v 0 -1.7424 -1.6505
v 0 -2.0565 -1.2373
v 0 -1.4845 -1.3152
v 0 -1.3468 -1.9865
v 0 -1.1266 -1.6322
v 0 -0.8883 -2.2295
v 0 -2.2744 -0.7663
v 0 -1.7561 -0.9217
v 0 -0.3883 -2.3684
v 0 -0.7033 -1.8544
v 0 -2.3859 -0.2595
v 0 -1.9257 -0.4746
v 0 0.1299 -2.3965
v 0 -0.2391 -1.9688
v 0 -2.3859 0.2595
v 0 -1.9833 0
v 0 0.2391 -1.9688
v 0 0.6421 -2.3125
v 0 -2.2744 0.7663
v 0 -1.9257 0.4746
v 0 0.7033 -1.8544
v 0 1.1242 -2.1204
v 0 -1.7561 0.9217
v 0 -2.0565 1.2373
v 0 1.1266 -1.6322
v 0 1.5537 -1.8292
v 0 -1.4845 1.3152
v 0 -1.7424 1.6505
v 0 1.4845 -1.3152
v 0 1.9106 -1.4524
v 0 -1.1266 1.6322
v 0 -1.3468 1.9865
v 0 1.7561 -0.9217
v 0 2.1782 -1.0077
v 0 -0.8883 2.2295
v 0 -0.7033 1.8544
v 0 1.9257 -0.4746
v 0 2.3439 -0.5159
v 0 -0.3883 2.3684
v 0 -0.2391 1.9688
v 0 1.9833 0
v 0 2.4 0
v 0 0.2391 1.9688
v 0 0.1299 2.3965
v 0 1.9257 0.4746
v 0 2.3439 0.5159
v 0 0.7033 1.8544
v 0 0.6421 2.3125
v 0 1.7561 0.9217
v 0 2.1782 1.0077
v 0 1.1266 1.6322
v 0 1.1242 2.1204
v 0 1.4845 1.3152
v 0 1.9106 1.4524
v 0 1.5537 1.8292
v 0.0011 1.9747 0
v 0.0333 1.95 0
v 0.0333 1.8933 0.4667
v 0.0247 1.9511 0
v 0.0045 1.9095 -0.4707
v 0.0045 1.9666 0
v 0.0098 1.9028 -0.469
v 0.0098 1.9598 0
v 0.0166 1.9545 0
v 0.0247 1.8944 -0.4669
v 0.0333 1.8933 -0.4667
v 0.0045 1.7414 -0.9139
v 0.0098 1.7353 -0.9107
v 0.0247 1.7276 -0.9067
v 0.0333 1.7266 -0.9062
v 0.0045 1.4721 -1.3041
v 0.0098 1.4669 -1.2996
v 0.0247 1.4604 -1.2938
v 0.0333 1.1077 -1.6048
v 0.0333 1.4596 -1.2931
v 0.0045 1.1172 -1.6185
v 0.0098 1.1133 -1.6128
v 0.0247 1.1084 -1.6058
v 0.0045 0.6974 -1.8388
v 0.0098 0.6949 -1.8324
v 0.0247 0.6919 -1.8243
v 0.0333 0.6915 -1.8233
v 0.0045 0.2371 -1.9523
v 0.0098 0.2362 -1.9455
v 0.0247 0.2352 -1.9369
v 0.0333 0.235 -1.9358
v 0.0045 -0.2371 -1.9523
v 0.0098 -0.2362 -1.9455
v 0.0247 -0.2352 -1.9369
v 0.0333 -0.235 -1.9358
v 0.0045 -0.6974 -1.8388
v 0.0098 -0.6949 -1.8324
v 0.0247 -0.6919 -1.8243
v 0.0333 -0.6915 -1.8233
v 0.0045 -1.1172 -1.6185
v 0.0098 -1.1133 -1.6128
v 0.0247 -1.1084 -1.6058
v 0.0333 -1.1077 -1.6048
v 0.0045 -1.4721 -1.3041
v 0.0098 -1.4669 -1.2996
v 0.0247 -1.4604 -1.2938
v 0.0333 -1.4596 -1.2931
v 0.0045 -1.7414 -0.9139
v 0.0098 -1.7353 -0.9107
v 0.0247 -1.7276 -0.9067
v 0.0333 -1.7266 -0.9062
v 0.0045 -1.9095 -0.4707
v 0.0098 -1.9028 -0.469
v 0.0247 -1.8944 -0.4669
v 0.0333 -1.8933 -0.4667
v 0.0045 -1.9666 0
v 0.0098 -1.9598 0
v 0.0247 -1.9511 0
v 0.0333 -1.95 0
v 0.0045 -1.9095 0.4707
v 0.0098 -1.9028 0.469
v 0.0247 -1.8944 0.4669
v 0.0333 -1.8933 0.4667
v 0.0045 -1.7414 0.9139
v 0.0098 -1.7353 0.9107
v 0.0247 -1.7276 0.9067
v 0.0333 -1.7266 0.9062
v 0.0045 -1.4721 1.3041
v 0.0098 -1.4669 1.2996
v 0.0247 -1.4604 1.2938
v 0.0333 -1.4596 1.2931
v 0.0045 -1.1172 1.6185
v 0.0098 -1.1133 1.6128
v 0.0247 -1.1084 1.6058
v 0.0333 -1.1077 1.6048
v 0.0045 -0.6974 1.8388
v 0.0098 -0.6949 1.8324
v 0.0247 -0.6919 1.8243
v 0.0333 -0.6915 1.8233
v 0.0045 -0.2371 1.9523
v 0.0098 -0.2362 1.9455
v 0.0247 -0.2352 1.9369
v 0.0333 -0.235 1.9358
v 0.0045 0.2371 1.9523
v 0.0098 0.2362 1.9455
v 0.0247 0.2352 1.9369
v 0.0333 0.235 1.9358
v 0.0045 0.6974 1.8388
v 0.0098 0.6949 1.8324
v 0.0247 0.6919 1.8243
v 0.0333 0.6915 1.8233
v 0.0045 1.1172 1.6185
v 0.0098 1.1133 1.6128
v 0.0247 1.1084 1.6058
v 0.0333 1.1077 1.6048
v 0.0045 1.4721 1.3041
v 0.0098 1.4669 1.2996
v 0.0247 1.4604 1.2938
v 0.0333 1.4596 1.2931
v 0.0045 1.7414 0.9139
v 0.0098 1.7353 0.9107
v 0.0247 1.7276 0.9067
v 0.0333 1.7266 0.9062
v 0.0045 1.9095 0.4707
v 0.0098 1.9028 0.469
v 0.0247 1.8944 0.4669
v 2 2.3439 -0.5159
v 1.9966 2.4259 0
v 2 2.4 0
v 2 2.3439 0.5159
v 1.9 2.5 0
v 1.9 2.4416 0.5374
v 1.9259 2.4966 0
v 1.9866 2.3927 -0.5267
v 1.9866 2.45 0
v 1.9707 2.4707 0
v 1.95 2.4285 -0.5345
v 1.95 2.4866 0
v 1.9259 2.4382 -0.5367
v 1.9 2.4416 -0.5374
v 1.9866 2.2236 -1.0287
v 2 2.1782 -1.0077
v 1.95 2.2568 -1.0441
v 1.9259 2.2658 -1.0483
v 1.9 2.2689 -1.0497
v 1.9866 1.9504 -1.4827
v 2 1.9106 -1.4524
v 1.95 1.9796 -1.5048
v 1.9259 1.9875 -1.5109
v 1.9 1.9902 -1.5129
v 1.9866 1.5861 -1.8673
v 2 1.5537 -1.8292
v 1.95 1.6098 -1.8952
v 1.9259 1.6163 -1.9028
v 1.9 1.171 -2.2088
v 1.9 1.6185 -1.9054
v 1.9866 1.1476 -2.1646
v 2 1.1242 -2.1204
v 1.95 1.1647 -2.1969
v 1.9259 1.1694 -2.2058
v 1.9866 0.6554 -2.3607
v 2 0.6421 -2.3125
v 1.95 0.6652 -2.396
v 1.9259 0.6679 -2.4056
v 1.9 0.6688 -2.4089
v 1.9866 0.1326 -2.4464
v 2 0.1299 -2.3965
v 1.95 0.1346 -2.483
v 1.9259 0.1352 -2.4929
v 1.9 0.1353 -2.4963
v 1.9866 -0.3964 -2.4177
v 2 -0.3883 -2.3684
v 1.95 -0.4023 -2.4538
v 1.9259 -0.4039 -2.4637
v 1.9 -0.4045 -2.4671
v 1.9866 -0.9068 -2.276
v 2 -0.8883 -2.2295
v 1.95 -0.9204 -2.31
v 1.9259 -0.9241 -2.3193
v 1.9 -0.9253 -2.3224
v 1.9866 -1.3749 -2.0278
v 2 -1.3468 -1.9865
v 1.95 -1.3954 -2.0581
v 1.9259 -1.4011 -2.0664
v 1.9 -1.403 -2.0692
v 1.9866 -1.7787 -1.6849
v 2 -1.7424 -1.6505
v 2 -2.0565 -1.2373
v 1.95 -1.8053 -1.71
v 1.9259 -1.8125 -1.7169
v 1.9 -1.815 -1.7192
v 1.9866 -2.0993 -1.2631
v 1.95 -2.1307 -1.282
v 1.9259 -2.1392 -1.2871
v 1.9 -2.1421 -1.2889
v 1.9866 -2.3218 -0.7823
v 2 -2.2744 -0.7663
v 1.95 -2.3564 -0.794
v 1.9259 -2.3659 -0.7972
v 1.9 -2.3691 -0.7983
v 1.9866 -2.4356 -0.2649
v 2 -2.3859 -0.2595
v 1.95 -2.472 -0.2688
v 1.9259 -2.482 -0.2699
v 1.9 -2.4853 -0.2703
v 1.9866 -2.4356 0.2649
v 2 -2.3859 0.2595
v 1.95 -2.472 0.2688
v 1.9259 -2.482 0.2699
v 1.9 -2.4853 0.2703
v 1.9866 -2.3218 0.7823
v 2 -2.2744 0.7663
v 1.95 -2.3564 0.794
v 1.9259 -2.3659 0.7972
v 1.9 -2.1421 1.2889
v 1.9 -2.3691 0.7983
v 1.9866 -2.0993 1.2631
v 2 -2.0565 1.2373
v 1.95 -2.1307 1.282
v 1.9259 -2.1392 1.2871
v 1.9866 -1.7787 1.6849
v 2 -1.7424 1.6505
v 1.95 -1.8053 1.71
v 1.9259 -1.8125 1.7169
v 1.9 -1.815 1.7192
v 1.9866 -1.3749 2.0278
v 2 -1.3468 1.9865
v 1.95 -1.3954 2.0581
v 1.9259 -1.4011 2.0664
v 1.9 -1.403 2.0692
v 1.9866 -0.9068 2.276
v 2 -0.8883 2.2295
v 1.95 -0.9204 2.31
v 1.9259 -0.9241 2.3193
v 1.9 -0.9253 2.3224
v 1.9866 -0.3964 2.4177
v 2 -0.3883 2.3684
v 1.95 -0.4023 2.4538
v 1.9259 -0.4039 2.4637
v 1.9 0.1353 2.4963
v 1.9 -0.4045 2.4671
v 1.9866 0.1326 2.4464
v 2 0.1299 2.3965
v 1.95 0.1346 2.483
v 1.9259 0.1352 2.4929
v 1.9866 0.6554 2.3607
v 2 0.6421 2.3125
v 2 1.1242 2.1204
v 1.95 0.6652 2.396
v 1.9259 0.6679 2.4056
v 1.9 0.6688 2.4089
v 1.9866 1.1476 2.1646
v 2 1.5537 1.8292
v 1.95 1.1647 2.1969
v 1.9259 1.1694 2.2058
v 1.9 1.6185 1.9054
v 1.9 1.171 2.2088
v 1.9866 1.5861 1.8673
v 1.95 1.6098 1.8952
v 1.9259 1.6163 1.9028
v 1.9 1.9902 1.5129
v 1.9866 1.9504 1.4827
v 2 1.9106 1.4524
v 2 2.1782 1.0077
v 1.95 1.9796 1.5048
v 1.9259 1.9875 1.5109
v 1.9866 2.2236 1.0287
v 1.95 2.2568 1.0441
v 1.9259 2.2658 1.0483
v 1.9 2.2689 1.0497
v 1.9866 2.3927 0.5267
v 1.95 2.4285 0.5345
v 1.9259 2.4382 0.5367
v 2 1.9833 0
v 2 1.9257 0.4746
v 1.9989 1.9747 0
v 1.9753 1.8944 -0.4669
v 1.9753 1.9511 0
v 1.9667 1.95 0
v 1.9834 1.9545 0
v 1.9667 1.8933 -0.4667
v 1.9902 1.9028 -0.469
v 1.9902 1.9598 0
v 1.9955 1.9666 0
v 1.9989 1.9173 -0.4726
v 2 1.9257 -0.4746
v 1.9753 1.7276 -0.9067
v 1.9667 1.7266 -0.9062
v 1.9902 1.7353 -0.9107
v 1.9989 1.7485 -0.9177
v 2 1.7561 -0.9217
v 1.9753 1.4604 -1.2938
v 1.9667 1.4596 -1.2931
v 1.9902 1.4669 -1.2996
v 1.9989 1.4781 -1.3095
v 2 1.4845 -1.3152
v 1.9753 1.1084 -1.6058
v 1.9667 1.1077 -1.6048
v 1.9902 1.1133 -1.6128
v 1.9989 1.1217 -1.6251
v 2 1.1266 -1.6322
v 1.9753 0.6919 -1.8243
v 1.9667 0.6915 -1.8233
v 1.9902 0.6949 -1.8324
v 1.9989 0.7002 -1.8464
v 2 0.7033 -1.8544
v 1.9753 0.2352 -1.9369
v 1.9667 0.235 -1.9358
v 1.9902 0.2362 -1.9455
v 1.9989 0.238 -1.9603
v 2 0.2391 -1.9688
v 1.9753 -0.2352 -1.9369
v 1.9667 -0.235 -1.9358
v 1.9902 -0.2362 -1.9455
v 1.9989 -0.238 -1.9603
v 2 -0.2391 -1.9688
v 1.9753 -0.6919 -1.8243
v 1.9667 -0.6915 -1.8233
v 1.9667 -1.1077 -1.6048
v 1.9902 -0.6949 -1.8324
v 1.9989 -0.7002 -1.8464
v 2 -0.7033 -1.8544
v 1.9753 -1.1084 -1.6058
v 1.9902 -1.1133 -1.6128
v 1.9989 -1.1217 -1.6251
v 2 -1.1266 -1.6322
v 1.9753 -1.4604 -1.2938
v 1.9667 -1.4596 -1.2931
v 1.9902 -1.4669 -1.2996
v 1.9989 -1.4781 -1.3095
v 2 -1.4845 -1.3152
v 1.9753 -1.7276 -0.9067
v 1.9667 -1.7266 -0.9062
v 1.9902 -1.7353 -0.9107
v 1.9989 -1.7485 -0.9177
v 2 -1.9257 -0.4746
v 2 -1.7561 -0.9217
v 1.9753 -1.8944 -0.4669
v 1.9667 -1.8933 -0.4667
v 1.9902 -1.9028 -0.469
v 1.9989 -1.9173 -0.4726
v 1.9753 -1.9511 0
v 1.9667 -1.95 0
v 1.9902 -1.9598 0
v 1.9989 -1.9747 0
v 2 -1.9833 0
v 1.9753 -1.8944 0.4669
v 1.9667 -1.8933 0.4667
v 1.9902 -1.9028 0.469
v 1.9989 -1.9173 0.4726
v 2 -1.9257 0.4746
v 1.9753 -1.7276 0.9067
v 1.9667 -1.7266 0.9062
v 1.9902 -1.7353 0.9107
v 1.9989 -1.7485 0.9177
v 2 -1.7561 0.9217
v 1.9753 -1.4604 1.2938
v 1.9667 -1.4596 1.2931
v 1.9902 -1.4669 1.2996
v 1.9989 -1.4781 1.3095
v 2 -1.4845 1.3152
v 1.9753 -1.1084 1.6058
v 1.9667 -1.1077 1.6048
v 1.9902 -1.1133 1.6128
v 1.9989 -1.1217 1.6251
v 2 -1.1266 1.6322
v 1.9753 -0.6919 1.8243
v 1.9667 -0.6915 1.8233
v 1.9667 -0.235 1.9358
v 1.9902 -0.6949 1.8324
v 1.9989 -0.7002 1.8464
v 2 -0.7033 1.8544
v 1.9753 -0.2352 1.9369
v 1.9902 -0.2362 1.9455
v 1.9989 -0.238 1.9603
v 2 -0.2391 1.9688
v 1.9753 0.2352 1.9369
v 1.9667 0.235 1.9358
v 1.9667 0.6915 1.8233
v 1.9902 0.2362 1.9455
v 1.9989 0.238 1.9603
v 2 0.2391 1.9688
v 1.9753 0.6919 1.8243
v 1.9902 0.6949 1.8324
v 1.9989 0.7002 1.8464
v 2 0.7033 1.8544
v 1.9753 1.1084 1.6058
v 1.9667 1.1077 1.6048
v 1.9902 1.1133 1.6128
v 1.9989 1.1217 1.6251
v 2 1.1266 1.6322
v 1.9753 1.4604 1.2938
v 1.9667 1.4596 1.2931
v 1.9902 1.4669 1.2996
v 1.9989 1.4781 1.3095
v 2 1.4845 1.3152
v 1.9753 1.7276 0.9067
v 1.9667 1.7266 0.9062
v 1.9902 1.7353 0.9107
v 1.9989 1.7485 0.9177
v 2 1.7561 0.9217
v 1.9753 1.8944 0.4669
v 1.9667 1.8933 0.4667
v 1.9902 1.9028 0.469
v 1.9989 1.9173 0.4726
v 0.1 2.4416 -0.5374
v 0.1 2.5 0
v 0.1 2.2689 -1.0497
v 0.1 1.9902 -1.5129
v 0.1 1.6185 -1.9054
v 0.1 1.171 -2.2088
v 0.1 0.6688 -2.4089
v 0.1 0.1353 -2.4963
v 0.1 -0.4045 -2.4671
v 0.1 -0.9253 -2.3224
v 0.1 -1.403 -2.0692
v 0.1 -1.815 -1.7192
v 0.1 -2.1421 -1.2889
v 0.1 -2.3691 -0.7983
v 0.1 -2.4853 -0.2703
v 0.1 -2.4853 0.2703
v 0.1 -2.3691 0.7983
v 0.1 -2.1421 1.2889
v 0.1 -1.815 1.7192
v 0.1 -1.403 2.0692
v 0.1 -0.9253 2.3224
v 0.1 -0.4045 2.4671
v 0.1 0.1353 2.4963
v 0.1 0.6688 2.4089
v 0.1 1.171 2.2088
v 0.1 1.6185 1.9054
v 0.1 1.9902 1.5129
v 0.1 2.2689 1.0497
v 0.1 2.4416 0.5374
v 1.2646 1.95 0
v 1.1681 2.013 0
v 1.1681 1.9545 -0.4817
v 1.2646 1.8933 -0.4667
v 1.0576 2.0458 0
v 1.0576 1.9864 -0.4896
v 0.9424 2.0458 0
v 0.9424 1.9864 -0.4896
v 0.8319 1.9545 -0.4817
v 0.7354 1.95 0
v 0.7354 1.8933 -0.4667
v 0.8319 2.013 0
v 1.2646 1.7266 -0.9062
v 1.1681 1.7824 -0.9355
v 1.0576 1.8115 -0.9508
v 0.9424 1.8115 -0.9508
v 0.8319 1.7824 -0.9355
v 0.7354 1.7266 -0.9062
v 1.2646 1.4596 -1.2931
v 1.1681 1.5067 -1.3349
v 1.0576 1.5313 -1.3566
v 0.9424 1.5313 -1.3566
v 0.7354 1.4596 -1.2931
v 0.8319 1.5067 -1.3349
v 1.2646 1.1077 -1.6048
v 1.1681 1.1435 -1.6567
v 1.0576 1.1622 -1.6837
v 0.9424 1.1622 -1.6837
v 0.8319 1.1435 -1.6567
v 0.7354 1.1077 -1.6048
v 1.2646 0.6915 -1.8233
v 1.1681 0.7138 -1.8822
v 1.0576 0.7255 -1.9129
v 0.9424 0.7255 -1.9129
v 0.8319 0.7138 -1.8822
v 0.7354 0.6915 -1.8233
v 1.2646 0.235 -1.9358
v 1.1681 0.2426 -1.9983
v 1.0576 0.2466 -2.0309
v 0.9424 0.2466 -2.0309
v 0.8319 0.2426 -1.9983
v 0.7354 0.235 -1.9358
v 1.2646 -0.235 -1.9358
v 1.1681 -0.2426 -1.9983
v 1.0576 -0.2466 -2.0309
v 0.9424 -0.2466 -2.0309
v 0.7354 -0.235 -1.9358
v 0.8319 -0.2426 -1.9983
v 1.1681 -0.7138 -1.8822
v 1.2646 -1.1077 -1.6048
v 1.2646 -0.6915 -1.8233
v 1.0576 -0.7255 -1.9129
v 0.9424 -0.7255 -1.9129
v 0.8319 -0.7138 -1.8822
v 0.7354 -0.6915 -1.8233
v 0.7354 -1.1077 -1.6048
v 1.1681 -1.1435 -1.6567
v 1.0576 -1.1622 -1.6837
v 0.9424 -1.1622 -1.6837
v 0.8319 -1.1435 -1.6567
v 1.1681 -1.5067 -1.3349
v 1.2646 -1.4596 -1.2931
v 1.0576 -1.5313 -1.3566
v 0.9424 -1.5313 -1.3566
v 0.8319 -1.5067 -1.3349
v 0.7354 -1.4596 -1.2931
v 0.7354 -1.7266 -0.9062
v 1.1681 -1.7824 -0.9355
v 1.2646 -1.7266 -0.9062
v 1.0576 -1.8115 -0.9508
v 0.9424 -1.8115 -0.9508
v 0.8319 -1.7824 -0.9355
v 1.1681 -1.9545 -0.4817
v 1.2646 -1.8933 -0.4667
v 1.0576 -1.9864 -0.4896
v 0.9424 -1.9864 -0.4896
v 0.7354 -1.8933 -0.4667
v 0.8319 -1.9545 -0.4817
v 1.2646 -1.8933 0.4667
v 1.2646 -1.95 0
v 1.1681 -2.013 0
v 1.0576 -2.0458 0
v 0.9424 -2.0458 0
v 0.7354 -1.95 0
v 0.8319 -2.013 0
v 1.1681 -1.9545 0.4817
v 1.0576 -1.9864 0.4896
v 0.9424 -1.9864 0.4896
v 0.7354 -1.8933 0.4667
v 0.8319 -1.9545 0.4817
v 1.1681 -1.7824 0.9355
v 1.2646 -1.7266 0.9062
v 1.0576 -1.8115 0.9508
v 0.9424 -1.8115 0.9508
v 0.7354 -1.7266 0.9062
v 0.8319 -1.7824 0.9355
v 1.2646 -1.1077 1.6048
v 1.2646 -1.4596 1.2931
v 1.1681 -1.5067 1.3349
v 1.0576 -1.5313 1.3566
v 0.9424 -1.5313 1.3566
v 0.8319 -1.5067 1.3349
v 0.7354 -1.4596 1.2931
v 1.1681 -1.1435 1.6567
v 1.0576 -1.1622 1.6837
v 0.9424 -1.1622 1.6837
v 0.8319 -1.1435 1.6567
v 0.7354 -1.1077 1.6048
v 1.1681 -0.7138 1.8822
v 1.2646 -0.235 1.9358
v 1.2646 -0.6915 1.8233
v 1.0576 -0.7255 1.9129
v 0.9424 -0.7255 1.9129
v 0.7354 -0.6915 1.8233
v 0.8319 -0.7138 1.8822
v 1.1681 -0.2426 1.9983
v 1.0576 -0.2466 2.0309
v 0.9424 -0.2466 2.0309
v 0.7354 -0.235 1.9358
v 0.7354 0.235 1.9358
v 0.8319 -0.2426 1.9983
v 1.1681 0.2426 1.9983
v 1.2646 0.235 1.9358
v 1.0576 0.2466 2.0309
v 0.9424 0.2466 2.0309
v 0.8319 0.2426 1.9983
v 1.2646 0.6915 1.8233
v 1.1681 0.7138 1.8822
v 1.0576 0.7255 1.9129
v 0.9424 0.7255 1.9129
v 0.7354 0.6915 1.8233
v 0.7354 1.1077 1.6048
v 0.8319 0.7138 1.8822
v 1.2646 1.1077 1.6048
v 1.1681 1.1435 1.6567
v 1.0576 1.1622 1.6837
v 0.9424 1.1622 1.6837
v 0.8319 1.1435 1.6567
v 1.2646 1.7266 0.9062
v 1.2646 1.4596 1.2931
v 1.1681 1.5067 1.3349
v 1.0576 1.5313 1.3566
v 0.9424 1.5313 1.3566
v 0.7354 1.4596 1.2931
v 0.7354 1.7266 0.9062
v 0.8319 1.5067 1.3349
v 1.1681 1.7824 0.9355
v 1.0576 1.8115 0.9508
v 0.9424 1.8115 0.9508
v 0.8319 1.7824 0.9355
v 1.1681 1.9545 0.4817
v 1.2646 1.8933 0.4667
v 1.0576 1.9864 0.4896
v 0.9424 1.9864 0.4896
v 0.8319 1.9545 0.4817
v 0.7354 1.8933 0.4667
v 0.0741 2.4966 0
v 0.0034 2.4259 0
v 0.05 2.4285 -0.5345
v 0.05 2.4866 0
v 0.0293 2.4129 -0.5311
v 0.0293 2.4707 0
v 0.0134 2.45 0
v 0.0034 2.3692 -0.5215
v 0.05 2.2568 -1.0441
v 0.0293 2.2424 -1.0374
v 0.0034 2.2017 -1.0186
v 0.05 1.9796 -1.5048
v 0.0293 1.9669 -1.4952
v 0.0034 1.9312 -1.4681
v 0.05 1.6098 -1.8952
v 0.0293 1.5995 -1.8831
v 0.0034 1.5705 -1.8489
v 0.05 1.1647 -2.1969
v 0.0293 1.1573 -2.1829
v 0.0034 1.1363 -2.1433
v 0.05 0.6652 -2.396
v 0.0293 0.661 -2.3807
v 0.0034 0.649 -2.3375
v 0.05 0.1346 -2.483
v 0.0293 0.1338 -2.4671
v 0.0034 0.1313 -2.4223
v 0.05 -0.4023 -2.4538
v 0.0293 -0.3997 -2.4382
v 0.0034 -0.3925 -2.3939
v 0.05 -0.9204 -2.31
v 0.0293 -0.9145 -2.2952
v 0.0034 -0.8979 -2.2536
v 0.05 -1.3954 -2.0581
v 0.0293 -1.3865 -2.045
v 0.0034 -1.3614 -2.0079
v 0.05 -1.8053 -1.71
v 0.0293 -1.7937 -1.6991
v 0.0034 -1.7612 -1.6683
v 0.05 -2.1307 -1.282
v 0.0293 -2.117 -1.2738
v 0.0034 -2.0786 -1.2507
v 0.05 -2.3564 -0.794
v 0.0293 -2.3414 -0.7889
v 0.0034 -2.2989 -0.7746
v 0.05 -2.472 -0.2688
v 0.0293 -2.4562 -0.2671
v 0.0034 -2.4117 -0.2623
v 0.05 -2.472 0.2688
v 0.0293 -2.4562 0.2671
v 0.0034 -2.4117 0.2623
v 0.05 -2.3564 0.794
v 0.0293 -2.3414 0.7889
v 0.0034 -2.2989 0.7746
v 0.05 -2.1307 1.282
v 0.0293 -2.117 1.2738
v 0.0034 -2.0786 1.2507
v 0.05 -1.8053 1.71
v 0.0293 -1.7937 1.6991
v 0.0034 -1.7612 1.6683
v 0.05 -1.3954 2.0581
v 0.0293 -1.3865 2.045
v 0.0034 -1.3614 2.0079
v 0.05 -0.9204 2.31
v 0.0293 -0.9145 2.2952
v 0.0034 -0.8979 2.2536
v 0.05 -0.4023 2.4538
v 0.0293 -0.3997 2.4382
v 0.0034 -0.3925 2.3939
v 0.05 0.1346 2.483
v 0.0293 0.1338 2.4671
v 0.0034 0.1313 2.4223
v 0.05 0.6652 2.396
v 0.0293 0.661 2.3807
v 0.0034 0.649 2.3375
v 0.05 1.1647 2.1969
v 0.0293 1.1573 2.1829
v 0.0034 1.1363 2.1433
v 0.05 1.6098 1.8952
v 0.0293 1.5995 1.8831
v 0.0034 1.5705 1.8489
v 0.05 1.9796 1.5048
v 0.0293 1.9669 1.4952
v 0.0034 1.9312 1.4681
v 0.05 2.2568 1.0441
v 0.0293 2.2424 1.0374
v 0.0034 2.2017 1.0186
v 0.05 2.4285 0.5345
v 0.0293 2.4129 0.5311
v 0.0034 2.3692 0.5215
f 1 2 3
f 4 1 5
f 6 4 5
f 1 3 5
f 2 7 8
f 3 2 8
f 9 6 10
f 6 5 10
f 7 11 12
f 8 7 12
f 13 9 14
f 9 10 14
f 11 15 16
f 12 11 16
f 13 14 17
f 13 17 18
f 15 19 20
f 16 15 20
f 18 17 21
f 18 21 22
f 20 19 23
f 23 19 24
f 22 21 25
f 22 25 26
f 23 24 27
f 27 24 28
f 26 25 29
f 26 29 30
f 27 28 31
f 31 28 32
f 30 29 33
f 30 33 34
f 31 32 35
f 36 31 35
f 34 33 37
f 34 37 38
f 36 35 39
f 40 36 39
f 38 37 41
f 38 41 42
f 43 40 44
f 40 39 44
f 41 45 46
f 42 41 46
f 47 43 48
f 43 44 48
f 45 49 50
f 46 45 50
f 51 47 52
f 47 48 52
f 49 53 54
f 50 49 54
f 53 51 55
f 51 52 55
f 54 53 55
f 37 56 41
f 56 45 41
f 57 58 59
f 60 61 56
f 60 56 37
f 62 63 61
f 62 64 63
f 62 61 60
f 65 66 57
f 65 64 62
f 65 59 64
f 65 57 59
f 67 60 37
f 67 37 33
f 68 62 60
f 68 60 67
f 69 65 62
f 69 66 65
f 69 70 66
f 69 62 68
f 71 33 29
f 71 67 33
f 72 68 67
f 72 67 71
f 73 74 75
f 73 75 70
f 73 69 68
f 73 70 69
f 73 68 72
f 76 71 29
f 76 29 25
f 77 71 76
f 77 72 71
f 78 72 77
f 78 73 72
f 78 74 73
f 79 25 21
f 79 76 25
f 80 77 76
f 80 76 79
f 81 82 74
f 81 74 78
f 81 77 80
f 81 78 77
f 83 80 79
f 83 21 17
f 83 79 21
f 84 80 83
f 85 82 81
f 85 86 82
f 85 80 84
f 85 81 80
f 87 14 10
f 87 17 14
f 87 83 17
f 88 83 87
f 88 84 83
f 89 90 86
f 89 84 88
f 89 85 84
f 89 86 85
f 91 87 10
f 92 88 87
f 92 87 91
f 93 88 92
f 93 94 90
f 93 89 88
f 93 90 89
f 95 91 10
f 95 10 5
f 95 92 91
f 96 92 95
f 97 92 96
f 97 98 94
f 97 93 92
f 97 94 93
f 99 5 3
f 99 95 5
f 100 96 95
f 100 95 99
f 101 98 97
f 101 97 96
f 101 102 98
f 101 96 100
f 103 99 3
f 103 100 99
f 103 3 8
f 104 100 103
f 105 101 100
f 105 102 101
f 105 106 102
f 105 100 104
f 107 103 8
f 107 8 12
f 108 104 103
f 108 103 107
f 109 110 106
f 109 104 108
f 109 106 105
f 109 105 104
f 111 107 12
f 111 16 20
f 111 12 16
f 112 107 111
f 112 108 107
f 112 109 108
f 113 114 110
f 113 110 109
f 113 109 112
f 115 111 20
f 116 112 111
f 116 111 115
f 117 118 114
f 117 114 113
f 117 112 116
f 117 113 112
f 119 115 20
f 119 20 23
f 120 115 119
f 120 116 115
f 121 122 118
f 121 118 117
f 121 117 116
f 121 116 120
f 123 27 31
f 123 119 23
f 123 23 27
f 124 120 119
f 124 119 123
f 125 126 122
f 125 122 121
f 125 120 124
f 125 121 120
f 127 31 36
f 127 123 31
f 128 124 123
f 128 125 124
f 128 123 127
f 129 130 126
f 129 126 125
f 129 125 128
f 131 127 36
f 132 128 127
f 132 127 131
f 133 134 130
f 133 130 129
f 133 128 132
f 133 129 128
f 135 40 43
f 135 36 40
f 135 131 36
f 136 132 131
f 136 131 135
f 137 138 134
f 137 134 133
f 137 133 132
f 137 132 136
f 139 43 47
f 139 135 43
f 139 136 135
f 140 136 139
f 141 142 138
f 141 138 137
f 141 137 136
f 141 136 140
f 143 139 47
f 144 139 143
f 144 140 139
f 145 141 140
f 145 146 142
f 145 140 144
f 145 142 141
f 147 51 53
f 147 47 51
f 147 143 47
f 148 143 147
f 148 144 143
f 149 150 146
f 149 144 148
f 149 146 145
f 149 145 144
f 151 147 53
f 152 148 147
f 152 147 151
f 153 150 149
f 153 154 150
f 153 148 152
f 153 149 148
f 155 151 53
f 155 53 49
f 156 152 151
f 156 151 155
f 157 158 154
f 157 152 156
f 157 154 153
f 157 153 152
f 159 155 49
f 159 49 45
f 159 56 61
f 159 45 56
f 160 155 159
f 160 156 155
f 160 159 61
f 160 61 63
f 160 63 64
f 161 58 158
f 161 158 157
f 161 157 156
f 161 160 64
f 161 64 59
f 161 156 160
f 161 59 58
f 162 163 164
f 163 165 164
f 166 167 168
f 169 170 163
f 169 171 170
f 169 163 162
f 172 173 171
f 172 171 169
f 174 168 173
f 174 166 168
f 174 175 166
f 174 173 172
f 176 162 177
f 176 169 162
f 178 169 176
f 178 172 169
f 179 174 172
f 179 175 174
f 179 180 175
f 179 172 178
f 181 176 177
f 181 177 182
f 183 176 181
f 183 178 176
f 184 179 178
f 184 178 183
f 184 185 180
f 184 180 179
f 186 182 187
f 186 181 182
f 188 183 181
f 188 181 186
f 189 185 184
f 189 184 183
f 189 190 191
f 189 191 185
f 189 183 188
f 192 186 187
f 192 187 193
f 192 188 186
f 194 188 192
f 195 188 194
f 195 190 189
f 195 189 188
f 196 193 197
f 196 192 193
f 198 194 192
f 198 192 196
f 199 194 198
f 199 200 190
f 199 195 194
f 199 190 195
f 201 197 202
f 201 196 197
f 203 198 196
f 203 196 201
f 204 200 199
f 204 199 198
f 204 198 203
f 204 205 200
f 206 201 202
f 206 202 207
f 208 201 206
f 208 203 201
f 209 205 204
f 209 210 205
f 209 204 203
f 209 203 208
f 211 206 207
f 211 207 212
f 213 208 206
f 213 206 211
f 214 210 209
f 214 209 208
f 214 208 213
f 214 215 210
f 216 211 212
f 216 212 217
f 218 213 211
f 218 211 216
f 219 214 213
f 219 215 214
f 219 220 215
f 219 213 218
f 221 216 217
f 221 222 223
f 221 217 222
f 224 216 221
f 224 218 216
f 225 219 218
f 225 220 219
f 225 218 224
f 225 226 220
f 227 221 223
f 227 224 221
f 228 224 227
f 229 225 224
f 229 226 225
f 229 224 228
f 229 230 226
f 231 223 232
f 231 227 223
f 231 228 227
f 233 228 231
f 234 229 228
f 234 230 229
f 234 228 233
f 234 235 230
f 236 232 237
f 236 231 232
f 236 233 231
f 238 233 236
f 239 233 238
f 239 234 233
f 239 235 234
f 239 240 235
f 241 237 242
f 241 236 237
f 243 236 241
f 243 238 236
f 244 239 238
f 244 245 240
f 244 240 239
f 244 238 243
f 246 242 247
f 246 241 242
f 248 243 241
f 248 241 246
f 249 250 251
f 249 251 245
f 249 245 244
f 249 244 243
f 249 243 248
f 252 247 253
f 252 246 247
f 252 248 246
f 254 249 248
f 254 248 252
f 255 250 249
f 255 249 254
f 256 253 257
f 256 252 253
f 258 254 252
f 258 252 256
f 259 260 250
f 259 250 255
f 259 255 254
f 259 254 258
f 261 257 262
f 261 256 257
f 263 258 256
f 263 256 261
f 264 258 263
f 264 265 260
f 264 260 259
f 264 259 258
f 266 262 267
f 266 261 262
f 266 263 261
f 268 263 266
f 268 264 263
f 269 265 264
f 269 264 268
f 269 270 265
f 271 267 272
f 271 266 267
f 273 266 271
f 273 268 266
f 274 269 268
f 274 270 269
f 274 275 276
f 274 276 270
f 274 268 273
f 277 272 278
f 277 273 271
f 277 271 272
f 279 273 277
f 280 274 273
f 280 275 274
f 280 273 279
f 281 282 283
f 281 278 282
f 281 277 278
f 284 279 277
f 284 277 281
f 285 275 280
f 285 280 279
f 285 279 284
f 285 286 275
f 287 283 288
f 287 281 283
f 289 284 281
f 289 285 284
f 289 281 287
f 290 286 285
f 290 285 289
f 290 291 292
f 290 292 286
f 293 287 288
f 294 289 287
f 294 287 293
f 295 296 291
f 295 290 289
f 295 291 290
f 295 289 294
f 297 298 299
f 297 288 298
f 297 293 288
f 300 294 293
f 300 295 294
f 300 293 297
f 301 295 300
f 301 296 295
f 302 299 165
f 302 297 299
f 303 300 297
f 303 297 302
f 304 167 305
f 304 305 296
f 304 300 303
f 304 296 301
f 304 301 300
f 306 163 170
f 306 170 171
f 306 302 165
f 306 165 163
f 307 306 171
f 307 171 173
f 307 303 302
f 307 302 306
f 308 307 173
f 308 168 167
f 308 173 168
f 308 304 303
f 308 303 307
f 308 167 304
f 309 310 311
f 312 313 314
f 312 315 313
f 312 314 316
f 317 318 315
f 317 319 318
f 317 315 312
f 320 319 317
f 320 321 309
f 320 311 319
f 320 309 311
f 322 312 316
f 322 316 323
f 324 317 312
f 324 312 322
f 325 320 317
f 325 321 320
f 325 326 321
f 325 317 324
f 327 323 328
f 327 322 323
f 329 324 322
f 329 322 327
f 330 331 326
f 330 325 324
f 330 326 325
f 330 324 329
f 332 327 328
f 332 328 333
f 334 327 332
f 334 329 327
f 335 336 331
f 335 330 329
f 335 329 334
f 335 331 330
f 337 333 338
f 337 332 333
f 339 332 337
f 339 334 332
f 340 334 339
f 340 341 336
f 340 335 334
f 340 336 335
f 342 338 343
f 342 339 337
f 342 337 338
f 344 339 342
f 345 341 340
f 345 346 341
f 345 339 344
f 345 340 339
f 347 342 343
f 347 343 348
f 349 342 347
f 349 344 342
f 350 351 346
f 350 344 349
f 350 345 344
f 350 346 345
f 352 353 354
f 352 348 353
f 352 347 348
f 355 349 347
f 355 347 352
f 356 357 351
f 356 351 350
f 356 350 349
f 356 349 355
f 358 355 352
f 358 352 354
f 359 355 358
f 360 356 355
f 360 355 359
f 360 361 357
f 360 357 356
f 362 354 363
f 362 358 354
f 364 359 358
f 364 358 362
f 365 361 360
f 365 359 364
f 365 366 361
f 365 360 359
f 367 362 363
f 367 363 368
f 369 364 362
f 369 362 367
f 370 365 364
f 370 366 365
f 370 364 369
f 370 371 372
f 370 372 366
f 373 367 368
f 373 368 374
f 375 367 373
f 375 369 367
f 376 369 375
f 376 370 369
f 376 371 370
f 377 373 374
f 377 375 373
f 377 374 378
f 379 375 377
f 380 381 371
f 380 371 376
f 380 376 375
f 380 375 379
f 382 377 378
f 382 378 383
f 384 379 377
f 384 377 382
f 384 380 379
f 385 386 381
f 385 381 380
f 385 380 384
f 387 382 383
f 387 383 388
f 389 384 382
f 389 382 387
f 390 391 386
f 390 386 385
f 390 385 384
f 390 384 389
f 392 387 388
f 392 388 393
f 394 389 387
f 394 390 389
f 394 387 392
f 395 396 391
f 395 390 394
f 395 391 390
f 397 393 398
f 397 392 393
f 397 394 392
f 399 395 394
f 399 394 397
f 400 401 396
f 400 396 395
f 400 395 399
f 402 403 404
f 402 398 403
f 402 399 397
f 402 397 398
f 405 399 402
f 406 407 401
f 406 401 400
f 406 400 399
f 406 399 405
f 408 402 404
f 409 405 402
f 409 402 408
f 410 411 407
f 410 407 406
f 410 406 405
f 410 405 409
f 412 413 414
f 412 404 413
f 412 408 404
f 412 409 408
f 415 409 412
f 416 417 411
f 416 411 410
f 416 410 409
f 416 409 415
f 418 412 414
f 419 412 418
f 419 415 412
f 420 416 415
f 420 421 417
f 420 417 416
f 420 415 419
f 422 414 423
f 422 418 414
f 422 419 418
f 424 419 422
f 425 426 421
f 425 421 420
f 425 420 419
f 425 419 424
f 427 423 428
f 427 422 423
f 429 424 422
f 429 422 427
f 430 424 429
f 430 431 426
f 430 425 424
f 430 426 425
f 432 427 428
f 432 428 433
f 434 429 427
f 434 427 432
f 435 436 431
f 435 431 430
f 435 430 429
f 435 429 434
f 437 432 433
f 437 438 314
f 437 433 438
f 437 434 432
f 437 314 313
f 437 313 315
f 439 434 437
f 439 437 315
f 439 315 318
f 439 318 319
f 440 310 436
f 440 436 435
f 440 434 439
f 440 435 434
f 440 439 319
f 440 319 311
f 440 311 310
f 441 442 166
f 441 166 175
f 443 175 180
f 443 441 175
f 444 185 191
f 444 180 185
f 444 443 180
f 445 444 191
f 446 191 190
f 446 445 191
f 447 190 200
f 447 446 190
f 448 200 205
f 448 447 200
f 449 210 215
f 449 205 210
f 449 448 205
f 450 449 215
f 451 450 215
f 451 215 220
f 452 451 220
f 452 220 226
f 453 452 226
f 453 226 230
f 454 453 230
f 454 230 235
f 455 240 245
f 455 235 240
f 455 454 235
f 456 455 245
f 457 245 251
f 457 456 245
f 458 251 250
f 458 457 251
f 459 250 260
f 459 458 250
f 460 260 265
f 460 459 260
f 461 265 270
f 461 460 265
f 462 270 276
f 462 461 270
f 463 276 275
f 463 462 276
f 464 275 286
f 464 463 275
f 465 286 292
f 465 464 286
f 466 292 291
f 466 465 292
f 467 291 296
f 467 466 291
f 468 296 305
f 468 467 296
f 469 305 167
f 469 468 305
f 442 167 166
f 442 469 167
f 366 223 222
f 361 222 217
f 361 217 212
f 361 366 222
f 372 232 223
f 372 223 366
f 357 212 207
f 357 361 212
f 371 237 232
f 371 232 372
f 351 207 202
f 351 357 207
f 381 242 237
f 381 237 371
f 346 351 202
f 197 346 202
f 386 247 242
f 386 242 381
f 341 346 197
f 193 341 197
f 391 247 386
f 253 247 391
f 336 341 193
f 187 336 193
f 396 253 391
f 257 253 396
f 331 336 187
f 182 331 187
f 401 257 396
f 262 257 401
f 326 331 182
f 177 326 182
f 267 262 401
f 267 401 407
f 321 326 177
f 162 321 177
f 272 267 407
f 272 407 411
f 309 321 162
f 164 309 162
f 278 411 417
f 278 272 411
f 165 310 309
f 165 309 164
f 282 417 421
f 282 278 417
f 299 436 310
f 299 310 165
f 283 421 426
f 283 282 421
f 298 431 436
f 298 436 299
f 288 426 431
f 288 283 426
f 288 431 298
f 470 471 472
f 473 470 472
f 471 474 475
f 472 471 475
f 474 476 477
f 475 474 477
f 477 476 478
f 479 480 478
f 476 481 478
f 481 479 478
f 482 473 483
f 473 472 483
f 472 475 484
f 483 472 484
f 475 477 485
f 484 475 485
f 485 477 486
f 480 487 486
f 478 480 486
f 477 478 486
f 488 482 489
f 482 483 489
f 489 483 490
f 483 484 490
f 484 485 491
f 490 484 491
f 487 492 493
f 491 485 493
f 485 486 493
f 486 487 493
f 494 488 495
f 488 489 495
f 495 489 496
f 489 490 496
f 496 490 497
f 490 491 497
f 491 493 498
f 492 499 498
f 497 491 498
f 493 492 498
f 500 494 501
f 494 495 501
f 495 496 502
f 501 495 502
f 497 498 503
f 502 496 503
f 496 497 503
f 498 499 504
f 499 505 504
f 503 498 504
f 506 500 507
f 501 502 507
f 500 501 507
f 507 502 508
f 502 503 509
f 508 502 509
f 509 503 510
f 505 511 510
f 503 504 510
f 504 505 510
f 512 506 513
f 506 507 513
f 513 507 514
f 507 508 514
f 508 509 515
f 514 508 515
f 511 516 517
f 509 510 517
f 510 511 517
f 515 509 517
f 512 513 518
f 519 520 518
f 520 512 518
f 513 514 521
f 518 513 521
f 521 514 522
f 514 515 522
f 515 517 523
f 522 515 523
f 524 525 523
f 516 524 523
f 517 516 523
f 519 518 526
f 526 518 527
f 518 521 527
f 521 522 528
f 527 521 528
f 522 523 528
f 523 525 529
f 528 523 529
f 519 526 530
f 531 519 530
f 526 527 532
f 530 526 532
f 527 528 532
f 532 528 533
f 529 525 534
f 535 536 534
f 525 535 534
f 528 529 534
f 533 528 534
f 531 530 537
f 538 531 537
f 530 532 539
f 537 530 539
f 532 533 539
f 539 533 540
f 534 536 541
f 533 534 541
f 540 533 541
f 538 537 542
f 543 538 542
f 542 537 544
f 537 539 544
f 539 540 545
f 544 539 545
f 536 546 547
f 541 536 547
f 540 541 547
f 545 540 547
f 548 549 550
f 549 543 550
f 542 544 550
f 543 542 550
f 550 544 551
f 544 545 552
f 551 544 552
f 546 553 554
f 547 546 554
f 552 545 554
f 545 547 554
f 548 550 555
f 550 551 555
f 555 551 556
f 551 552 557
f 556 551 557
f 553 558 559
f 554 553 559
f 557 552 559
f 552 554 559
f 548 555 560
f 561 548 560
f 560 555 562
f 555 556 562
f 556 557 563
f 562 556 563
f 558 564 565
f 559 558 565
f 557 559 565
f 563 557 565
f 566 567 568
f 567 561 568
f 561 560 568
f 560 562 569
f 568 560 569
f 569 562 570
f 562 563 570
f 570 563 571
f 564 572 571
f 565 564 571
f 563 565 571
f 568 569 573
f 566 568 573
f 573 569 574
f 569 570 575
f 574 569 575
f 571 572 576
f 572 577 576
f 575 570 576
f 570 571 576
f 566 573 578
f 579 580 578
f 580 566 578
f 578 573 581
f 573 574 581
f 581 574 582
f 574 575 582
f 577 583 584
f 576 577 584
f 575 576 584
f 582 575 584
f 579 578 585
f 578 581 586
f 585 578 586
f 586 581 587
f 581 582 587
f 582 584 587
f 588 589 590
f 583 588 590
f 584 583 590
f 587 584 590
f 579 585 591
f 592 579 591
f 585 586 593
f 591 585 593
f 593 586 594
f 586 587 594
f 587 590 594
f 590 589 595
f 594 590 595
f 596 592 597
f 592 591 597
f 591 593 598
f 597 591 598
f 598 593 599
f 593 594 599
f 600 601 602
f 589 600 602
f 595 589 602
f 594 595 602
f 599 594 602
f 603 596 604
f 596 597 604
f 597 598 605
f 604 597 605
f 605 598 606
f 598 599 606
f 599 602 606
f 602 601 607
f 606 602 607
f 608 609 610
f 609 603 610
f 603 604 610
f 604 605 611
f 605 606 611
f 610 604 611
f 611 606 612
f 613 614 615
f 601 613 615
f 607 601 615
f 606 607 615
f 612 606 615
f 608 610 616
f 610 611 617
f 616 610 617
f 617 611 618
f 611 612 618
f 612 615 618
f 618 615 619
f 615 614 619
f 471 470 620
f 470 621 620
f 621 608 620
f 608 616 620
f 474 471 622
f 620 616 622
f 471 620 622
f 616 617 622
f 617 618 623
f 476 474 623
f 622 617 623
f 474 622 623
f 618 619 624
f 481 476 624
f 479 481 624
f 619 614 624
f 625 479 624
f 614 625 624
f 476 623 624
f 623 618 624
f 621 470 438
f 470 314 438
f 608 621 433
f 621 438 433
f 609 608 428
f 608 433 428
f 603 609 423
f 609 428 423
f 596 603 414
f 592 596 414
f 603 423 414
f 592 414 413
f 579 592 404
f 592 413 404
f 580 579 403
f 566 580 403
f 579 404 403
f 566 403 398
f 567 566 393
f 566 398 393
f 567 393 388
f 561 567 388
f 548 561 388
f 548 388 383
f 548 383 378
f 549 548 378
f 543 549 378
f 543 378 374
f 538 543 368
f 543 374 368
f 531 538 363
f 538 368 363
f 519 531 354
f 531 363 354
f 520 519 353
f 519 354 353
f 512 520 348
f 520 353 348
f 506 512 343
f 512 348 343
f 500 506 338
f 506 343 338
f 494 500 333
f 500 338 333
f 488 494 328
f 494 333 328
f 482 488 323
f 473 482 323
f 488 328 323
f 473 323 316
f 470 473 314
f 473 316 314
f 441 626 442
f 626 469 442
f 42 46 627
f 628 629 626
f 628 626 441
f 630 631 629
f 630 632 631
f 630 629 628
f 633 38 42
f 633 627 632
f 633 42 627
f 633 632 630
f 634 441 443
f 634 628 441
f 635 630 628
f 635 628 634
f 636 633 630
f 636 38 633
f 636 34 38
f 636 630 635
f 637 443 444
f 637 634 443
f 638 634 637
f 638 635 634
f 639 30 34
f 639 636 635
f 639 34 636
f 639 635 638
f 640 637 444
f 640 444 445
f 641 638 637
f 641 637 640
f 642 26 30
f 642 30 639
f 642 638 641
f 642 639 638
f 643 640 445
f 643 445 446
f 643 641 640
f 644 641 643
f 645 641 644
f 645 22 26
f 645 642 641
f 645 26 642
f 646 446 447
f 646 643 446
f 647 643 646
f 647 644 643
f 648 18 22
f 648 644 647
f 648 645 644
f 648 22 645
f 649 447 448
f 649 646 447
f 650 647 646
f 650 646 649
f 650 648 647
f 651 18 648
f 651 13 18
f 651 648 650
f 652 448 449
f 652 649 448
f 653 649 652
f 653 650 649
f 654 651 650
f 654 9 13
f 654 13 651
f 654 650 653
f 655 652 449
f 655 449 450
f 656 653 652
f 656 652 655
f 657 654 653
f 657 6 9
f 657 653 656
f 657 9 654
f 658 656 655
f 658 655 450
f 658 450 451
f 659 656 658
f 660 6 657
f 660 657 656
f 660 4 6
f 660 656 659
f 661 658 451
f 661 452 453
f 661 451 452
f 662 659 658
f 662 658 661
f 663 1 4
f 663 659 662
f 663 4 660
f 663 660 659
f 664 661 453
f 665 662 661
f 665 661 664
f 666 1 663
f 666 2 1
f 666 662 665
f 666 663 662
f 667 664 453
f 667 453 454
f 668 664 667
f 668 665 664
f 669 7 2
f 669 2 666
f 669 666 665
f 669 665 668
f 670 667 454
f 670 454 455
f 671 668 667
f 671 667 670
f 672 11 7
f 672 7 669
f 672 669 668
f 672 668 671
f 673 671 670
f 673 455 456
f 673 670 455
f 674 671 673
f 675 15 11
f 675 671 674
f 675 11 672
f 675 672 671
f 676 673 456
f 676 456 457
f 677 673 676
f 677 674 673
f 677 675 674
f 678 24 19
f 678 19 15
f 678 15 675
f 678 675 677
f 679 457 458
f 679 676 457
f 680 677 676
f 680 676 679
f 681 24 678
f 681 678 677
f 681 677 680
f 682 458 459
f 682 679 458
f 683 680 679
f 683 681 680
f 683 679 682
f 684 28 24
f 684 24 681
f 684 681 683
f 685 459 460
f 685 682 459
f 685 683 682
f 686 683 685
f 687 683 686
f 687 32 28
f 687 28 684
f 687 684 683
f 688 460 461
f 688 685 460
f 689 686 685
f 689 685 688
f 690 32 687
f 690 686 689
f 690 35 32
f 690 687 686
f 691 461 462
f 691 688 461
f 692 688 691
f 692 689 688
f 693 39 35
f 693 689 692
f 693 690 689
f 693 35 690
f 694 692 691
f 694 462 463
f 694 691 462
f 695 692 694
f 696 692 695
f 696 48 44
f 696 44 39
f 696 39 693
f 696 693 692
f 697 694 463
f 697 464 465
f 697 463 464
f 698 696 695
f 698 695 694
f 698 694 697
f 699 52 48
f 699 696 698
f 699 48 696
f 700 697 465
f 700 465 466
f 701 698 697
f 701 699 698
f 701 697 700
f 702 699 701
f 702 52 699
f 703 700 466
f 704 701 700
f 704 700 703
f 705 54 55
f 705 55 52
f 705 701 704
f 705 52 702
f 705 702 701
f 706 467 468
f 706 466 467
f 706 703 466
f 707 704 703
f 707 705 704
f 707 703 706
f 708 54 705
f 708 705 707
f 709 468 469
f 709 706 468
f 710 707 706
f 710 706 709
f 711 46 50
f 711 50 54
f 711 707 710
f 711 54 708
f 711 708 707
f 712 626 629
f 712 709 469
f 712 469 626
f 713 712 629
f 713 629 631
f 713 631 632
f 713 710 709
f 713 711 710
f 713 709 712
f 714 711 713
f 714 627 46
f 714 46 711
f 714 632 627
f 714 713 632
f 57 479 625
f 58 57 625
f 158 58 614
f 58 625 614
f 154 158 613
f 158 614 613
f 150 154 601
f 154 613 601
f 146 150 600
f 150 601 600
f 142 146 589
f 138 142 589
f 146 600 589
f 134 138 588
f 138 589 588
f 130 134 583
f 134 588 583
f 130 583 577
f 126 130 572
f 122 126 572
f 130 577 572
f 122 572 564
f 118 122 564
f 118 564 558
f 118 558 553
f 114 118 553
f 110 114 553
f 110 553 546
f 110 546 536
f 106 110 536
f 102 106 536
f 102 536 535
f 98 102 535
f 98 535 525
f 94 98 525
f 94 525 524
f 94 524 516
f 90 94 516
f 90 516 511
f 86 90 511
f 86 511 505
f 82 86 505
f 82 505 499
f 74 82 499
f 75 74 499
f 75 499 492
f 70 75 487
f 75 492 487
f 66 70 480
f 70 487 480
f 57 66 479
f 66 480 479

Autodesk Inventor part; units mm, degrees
ref_plane "YZ Plane" through (0, 0, 0) normal (1, 0, 0) x (0, 1, 0)
ref_plane "XZ Plane" through (0, 0, 0) normal (0, 1, 0) x (-1, 0, 0)
ref_plane "XY Plane" through (0, 0, 0) normal (0, 0, 1) x (1, 0, 0)
sketch "Sketch_7" plane through (0, 0, 0) normal (0, 0, 1) x (1, 0, 0)
  line L0 (2, 0) -> (-2, 0)
  arc A0 (0, 1.9833) -> (0.0333, 1.95) centre (0.0333, 1.9833) ccw
  line L1 (0.0333, 1.95) -> (0.7354, 1.95)
  arc A1 (1.2646, 1.95) -> (0.7354, 1.95) centre (1, 1.65) ccw
  line L2 (1.2646, 1.95) -> (1.9667, 1.95)
  arc A2 (1.9667, 1.95) -> (2, 1.9833) centre (1.9667, 1.9833) ccw
  line L3 (2, 1.9833) -> (2, 2.4)
  arc A3 (2, 2.4) -> (1.9, 2.5) centre (1.9, 2.4) ccw
  line L4 (1.9, 2.5) -> (0.1, 2.5)
  arc A4 (0.1, 2.5) -> (0, 2.4) centre (0.1, 2.4) ccw
  line L5 (0, 2.4) -> (0, 1.9833)
revolve "Revolution1" add sketch "Sketch_7" angle 360 about axis through (2, 0, 0) along (1, 0, 0)
properties part number "W 618/2 X_PART2"
